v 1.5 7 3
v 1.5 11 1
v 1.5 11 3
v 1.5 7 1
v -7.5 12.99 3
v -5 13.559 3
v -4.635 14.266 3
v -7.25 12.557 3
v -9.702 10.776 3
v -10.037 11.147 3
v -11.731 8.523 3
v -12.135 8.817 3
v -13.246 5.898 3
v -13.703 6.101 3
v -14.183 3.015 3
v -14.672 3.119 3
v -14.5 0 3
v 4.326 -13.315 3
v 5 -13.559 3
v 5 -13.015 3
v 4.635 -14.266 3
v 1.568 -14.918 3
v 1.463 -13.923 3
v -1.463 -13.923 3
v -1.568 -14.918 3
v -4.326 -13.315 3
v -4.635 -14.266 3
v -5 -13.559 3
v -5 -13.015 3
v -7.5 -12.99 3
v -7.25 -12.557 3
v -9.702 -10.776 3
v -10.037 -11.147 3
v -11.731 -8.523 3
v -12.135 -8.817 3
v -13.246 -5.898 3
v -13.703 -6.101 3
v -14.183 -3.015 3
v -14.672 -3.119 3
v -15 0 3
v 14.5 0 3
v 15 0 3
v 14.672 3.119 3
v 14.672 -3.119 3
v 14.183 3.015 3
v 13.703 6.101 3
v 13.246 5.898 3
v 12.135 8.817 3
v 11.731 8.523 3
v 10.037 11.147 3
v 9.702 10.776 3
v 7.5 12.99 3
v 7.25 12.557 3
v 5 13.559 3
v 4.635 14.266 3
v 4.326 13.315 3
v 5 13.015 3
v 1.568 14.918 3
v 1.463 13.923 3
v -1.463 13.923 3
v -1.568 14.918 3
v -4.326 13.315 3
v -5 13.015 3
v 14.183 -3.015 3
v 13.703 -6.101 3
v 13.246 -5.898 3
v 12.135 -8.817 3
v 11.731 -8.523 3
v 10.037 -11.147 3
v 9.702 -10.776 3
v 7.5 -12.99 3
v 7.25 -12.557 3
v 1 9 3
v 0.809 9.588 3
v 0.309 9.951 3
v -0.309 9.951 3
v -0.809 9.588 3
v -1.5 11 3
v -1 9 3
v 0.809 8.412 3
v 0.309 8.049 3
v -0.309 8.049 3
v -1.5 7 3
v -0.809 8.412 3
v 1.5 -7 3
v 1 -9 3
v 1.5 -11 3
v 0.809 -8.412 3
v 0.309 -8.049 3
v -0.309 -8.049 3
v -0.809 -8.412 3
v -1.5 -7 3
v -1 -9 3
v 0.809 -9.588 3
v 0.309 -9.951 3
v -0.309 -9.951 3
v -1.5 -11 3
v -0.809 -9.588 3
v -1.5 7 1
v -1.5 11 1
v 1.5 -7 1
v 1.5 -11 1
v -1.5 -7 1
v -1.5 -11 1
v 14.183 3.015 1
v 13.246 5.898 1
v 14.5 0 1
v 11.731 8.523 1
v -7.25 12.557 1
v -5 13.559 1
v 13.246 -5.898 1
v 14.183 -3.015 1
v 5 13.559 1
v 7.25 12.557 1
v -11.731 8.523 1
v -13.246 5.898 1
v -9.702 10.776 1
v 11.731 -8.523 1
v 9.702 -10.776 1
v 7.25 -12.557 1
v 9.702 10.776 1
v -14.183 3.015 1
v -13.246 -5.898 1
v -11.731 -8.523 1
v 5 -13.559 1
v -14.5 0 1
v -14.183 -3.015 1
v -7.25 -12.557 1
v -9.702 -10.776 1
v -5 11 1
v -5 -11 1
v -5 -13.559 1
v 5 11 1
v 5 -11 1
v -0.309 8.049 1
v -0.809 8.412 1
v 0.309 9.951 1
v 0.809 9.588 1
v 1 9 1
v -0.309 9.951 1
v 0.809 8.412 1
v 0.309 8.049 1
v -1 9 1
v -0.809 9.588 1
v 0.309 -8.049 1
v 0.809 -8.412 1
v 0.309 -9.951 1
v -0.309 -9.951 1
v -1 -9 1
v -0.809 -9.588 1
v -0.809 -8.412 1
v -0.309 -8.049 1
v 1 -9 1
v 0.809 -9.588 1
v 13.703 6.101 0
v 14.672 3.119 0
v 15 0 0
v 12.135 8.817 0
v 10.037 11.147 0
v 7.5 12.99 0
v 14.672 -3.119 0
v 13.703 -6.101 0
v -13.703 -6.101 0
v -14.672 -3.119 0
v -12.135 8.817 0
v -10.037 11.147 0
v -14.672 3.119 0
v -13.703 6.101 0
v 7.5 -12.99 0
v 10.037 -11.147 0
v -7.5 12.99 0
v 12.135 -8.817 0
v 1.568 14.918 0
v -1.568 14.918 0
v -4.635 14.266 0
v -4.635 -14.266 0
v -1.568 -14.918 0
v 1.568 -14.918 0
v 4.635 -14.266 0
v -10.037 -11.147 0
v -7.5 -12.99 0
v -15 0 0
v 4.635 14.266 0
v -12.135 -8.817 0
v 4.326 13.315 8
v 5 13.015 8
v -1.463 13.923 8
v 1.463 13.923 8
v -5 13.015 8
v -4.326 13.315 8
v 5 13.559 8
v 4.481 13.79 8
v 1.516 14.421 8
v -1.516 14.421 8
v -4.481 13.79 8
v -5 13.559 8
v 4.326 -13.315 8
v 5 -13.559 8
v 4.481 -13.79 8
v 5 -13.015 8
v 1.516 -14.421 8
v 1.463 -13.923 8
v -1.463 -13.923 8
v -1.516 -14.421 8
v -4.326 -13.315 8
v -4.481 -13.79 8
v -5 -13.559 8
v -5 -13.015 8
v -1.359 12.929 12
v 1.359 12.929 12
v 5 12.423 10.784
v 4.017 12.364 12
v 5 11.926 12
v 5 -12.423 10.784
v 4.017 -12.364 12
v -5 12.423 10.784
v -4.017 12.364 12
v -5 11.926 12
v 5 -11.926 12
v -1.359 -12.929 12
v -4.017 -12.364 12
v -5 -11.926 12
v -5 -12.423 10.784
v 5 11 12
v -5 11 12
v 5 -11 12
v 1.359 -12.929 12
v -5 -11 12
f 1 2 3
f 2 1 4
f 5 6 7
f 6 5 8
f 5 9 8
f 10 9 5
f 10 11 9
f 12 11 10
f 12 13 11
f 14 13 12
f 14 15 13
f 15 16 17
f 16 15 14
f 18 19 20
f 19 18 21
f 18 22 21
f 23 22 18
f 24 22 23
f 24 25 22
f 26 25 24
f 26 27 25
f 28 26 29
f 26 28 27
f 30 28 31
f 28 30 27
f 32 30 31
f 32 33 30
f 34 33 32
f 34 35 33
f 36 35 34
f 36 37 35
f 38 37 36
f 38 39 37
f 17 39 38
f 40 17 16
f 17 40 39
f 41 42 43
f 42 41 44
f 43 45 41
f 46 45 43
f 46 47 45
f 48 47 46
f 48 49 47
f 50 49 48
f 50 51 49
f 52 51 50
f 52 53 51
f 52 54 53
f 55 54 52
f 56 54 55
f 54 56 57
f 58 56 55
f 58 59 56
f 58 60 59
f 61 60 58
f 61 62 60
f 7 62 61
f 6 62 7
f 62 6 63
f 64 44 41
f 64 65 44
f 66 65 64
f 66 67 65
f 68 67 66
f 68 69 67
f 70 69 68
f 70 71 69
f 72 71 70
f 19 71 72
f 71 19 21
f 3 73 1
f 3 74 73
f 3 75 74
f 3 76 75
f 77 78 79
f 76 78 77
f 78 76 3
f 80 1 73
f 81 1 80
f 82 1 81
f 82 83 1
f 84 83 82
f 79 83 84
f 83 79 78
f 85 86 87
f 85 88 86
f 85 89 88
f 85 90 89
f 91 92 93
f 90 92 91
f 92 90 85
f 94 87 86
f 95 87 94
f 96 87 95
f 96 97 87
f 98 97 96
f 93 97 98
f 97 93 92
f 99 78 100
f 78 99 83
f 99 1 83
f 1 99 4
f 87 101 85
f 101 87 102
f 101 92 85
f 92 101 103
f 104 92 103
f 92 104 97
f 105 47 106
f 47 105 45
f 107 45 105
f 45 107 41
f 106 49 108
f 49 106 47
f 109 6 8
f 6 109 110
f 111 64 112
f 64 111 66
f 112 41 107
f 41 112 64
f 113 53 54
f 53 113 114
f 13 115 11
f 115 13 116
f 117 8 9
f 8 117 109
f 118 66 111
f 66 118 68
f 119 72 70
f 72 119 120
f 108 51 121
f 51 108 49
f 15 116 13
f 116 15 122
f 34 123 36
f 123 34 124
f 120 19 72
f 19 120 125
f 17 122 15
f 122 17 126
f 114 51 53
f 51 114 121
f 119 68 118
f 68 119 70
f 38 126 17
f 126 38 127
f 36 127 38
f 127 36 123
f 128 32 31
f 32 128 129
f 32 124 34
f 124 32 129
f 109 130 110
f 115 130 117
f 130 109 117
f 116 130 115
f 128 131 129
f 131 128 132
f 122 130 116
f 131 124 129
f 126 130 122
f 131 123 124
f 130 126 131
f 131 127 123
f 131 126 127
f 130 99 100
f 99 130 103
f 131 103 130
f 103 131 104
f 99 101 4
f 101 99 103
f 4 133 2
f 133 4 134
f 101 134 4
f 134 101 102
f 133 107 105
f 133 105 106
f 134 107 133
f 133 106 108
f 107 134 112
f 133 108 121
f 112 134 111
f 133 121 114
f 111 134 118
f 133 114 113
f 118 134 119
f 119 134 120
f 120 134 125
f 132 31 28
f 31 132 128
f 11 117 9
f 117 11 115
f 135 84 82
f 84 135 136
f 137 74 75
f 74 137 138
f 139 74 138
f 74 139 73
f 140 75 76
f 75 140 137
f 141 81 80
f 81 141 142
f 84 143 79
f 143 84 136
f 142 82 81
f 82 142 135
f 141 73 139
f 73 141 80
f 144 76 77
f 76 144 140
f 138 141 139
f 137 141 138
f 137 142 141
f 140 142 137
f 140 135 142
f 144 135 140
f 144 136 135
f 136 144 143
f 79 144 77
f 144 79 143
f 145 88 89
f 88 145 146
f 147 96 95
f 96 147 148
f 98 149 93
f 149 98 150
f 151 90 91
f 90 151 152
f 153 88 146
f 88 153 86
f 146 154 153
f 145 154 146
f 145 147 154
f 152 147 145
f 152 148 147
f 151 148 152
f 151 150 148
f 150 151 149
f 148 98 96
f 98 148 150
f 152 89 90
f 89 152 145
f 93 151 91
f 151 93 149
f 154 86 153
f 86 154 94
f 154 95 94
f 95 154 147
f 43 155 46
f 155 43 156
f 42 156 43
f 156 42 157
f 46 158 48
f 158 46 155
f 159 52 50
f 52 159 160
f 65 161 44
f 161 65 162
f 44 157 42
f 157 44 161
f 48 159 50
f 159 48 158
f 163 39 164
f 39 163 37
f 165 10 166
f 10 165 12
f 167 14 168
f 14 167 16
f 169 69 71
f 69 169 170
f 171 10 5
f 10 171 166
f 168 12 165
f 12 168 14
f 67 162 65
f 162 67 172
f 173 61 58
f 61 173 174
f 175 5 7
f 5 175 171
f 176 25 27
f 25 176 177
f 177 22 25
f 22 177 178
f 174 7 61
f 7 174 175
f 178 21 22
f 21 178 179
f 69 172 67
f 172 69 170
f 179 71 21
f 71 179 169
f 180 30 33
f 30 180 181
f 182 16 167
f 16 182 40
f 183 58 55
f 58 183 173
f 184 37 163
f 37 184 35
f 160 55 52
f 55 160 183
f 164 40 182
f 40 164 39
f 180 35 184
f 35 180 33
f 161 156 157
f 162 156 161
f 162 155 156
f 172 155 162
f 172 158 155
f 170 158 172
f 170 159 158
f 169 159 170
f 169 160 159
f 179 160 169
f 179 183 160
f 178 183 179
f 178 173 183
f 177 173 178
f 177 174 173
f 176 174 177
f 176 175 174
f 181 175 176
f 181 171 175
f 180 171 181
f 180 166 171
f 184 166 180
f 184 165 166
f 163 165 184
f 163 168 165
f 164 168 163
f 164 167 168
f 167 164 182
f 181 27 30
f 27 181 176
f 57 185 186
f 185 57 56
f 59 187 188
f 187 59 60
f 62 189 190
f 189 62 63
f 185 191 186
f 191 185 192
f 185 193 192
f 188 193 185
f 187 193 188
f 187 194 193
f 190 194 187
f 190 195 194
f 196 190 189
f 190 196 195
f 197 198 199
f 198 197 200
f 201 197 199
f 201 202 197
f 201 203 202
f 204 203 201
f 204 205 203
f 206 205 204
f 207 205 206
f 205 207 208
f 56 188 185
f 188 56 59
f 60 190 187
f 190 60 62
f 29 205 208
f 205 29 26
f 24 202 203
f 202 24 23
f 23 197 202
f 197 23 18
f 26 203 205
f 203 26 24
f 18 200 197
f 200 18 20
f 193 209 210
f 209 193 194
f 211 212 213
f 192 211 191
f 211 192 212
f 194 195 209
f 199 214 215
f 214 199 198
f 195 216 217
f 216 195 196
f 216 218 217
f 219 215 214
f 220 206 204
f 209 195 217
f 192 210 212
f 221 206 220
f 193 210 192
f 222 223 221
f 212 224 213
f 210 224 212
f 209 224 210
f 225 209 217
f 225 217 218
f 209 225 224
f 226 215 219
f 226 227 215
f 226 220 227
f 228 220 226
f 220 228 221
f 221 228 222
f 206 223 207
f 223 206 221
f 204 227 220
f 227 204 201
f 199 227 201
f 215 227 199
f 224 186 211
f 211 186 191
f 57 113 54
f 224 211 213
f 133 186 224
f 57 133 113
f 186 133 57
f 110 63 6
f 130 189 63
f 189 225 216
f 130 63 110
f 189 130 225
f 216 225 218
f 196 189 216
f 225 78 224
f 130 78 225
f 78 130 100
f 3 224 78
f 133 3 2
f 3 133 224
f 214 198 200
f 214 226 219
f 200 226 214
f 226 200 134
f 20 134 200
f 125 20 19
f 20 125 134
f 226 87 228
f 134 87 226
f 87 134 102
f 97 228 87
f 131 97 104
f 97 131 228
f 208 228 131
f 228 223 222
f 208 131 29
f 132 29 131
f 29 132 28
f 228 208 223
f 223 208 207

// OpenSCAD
body_height = 3;
body_thickness = 1;
main_d = 30;
flap_width = 3;
flap_length = 8;
flap_hole_pos = 9;
flap_hole_d = 2;
pacicka_mid_height = 8;
pacicka_height = 12;
pacicka_top_d = 26;
pacicka_hole_d = 28;
pacicka_width = 10;
pacicka_pos = 11;

union () {
  difference () {
    cylinder (body_height, d=main_d);
    difference () {
      translate ([0, 0, body_thickness]) {
        cylinder (body_height, d=main_d-body_thickness);
      }
      for (rot=[0, 180]) rotate ([0, 0, rot]) {
        translate ([-flap_width/2, main_d/2-flap_length, 0]) {
          cube ([flap_width, flap_length, body_height]);
        }
      }
    }
    for (rot=[0, 180]) rotate ([0, 0, rot]) {
      translate ([0, flap_hole_pos, body_thickness]) {
        cylinder (body_height, d=flap_hole_d, $fn=10);
      }
    }
  }
  intersection () {
    union () {
      cylinder (pacicka_mid_height, d=pacicka_hole_d);
      cylinder (body_height, d=main_d);
      translate ([0, 0, pacicka_mid_height]) {
        cylinder (pacicka_height-pacicka_mid_height,
                  d1=main_d-body_thickness,
                  d2=pacicka_top_d);
      }
    }
    for (rot=[0, 180]) rotate ([0, 0, rot]) {
      translate ([-pacicka_width/2, pacicka_pos, -500]) {
        cube ([pacicka_width, 1000, 1000]);
      }
    }
  }
}
